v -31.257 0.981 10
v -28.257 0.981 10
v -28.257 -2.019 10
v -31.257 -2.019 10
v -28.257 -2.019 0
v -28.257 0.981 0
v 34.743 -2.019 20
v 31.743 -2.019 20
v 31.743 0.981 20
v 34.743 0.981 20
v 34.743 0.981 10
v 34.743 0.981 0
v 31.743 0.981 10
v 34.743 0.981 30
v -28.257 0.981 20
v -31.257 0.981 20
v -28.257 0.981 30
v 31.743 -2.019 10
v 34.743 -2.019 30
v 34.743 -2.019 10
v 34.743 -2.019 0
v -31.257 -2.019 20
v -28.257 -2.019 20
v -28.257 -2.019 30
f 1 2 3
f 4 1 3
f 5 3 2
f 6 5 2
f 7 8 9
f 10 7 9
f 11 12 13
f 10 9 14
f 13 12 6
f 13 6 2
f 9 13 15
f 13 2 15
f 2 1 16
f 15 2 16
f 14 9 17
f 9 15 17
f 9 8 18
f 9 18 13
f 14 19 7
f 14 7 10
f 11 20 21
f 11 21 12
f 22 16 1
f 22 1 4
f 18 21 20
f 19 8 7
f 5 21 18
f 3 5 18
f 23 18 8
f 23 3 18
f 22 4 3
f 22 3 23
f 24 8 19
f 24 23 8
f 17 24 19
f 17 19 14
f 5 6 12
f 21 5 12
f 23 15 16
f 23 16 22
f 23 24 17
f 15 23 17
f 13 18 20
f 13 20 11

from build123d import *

# Parameters (mm, degrees)
F0_W     = 60
F0_H     = 3
F1_DEPTH = 30
F2_W     = 3
F2_H     = 10
F3_DEPTH = 3
F4_W     = 3
F4_H     = 10
F5_DEPTH = 3


with BuildPart() as f1:
    # F0 (on Top) → F1 (new body)
    with BuildSketch(Plane.XY):
        with Locations((1.74342, -0.519499)):
            Rectangle(F0_W, F0_H)
    extrude(amount=F1_DEPTH)

    # F2 (on face) → F3 (join)
    with BuildSketch(Plane.YZ.offset(31.74342)):
        with Locations((-0.519499, 25)):
            Rectangle(F2_W, F2_H)
        with Locations((-0.519499, 5)):
            Rectangle(F2_W, F2_H)
    extrude(amount=F3_DEPTH)

    # F4 (on face) → F5 (join)
    with BuildSketch(Plane(origin=(-28.25658, 0, 0), x_dir=(0, -1, 0), z_dir=(-1, 0, 0))):
        with Locations((0.519499, 15)):
            Rectangle(F4_W, F4_H)
    extrude(amount=F5_DEPTH)


solid = f1.part
